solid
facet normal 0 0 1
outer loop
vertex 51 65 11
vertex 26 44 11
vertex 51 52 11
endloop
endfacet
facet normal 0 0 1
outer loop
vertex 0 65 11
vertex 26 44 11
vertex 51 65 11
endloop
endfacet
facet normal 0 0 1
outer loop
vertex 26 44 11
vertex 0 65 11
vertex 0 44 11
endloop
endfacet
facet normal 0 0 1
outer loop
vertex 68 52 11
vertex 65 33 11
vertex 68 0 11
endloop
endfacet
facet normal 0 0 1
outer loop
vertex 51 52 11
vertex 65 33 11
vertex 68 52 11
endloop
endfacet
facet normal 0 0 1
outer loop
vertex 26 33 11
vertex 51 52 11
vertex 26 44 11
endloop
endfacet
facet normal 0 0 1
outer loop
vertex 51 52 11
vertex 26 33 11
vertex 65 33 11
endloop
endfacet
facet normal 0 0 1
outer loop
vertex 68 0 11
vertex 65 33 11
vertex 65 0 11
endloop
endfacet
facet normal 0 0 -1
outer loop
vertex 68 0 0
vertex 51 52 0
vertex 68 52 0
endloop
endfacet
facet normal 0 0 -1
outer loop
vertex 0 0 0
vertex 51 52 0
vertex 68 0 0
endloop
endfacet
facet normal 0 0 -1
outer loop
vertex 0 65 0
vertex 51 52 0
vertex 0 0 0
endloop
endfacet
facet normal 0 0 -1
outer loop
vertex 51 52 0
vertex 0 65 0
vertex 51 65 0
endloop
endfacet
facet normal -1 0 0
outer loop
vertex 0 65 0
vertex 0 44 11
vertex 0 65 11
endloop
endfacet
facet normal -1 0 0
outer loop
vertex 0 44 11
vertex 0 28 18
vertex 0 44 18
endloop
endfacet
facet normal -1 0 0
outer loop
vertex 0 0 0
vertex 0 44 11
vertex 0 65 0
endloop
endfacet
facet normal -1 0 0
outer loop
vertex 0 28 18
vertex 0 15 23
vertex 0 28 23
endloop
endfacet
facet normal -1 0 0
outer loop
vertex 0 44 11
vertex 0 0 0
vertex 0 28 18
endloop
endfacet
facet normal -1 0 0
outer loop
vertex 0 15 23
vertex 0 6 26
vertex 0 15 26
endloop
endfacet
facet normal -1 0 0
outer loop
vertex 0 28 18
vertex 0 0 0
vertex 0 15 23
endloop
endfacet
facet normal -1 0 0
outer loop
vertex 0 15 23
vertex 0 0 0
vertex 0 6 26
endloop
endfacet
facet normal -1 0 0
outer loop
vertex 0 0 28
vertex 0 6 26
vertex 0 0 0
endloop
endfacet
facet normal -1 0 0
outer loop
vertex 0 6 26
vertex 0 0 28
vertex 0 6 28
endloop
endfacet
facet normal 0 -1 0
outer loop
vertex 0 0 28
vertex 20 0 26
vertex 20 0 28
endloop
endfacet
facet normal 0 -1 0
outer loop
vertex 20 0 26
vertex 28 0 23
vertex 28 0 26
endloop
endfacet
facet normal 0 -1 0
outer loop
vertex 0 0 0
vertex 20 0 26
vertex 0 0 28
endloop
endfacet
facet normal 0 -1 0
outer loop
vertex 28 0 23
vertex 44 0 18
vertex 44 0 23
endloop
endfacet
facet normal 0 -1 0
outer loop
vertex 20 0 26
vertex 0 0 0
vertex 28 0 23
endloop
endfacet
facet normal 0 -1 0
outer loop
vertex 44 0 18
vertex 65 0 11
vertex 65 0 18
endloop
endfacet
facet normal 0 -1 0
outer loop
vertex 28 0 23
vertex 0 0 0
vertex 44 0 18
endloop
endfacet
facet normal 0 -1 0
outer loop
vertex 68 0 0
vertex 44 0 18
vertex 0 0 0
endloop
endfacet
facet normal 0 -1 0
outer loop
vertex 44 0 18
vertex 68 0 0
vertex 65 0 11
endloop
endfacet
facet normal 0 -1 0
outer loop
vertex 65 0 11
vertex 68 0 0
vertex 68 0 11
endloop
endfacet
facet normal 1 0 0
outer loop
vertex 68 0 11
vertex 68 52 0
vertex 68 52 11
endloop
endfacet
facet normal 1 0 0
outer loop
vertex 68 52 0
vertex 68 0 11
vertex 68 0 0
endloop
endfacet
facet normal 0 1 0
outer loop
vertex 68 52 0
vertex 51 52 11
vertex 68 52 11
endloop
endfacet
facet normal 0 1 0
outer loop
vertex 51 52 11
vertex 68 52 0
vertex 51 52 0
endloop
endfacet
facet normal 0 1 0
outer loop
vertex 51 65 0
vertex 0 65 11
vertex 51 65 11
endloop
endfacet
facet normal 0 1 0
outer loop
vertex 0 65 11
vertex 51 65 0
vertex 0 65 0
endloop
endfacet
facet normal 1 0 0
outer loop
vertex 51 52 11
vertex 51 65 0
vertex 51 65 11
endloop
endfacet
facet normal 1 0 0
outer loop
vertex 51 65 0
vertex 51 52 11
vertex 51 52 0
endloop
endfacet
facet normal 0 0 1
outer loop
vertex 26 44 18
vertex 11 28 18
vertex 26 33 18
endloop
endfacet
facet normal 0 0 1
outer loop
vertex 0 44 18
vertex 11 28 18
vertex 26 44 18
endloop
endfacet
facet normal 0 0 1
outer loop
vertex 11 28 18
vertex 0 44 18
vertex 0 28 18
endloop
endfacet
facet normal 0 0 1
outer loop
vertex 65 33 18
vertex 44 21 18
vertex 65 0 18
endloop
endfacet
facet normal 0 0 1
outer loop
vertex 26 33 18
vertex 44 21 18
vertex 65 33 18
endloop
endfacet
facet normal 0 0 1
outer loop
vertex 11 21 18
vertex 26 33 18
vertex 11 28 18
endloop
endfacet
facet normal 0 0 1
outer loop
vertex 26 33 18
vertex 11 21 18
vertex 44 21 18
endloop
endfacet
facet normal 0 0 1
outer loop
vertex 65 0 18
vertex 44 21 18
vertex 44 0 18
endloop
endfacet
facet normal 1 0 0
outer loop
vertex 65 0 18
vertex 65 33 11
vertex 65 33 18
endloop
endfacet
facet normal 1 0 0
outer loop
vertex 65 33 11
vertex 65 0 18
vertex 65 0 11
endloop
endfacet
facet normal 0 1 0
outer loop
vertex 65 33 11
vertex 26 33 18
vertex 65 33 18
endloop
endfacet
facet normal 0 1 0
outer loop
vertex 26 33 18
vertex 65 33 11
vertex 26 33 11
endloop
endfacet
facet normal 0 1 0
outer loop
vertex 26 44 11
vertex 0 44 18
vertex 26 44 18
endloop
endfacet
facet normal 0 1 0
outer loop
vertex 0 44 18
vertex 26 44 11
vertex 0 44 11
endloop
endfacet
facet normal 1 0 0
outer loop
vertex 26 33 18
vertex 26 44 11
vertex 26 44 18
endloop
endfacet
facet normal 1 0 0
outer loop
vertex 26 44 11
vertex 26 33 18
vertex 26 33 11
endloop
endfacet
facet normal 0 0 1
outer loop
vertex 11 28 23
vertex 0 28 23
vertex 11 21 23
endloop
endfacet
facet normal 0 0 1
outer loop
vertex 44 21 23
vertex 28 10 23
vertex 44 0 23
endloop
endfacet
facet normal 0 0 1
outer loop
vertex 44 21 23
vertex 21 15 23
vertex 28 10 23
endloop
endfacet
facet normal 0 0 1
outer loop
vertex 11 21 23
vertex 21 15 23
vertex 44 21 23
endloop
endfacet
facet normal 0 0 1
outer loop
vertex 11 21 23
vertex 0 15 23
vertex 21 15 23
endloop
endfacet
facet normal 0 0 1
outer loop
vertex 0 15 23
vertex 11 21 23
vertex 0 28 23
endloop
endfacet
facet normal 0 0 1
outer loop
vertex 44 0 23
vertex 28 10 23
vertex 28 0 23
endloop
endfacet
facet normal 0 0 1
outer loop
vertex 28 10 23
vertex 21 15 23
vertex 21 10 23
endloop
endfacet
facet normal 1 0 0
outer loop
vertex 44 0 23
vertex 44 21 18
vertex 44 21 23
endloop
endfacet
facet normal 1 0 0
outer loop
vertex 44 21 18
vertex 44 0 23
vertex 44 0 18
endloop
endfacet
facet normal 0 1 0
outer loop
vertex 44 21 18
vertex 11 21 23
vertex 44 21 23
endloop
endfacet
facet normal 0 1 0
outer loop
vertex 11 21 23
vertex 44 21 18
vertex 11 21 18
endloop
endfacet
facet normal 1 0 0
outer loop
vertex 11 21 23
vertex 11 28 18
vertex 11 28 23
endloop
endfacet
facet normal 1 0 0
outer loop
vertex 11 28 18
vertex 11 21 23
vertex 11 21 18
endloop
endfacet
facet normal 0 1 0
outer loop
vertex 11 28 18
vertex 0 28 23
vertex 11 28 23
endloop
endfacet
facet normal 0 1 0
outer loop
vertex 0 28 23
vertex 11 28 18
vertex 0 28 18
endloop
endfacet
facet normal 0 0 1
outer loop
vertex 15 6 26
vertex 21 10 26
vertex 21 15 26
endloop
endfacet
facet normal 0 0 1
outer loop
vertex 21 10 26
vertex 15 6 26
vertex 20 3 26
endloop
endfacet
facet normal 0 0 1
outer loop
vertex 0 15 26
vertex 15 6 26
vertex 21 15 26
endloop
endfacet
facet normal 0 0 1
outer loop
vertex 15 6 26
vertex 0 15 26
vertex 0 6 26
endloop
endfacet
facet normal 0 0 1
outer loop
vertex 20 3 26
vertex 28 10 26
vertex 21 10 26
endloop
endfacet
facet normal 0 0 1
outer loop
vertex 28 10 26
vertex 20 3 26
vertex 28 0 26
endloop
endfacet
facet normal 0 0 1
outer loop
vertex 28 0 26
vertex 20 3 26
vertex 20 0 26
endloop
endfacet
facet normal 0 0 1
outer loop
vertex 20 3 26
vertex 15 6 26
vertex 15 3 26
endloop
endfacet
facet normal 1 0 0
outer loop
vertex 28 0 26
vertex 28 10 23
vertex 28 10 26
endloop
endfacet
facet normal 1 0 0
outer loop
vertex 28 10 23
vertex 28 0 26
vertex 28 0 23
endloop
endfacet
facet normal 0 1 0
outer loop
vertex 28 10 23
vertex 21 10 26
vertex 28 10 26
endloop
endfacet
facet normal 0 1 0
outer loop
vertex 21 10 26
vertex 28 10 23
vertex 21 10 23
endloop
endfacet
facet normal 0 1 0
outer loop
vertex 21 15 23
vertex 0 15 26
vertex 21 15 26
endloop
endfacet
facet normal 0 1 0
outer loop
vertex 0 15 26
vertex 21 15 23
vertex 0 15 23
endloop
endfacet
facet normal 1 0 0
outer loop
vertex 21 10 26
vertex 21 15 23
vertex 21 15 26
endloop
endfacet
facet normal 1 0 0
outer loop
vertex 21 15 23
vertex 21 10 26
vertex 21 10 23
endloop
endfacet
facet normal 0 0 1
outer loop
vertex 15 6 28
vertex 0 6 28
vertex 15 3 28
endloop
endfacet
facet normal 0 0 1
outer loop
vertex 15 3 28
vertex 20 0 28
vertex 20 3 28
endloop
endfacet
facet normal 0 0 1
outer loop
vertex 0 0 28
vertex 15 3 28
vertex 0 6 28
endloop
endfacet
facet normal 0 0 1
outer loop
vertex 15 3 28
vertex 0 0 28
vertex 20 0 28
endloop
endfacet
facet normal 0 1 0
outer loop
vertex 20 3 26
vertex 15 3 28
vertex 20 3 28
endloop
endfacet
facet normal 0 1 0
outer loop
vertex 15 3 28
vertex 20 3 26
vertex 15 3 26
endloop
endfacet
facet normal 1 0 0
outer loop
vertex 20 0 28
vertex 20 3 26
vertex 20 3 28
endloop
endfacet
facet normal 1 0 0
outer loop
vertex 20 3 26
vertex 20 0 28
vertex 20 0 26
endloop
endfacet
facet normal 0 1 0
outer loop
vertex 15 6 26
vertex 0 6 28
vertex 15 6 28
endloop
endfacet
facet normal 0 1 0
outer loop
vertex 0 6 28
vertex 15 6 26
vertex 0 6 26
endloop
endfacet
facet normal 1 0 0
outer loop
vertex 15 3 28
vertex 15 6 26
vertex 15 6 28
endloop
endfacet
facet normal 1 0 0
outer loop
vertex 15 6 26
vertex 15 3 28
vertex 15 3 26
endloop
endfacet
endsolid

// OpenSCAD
translate([8.5, 6.5, 5.5]) color([0.6489922579129634, 0.19497362064878687, 0.7834169698984913]) cube([17, 13, 11], center=true);
translate([25.5, 6.5, 5.5]) color([0.7774609885388588, 0.11099692345616674, 0.060160827712116616]) cube([17, 13, 11], center=true);
translate([42.5, 6.5, 5.5]) color([0.7008174245595068, 0.6143308403515266, 0.9339155207415325]) cube([17, 13, 11], center=true);
translate([59.5, 6.5, 5.5]) color([0.6504721799814983, 0.9694854220936419, 0.7136168898793864]) cube([17, 13, 11], center=true);
translate([8.5, 19.5, 5.5]) color([0.2963863893491513, 0.8491315553121948, 0.95846907728749]) cube([17, 13, 11], center=true);
translate([25.5, 19.5, 5.5]) color([0.38764569013819994, 0.29380353478258403, 0.7457841029207014]) cube([17, 13, 11], center=true);
translate([42.5, 19.5, 5.5]) color([0.9575468650535228, 0.98339807845839, 0.12155240415787172]) cube([17, 13, 11], center=true);
translate([59.5, 19.5, 5.5]) color([0.8604321836344089, 0.9958411320233901, 0.03818441020037311]) cube([17, 13, 11], center=true);
translate([8.5, 32.5, 5.5]) color([0.39202639046743215, 0.3715816420064585, 0.19047756087385292]) cube([17, 13, 11], center=true);
translate([25.5, 32.5, 5.5]) color([0.3565538137373233, 0.6320134108911423, 0.9564975354421206]) cube([17, 13, 11], center=true);
translate([42.5, 32.5, 5.5]) color([0.901927522825372, 0.039980675922074105, 0.2553863294502452]) cube([17, 13, 11], center=true);
translate([59.5, 32.5, 5.5]) color([0.02665600139486224, 0.5200631817170318, 0.5692567569896342]) cube([17, 13, 11], center=true);
translate([8.5, 45.5, 5.5]) color([0.8758772851227178, 0.2296552367022351, 0.7763426439418957]) cube([17, 13, 11], center=true);
translate([25.5, 45.5, 5.5]) color([0.8846860519705121, 0.6274277551427163, 0.5024128608294012]) cube([17, 13, 11], center=true);
translate([42.5, 45.5, 5.5]) color([0.5237115354844265, 0.5071067236759631, 0.9454855480301745]) cube([17, 13, 11], center=true);
translate([59.5, 45.5, 5.5]) color([0.14569042195357562, 0.8918421087116969, 0.42205651792049836]) cube([17, 13, 11], center=true);
translate([8.5, 58.5, 5.5]) color([0.08403205823715598, 0.1047646210762947, 0.06292282863863541]) cube([17, 13, 11], center=true);
translate([25.5, 58.5, 5.5]) color([0.4151614515022839, 0.15615697007089357, 0.9545538427732947]) cube([17, 13, 11], center=true);
translate([42.5, 58.5, 5.5]) color([0.7913428503775491, 0.43108631436838285, 0.41701950900356644]) cube([17, 13, 11], center=true);
translate([6.5, 5.5, 14.5]) color([0.4966247746294912, 0.86405767472269, 0.32449912818180593]) cube([13, 11, 7], center=true);
translate([19.5, 5.5, 14.5]) color([0.25258592574699623, 0.35250302456564797, 0.12137799977699892]) cube([13, 11, 7], center=true);
translate([32.5, 5.5, 14.5]) color([0.691775150815975, 0.34544510653523897, 0.17790766067776254]) cube([13, 11, 7], center=true);
translate([45.5, 5.5, 14.5]) color([0.830270051764872, 0.23049353673314077, 0.3658024748453319]) cube([13, 11, 7], center=true);
translate([58.5, 5.5, 14.5]) color([0.5965890354919068, 0.14329113966210216, 0.003232100641658797]) cube([13, 11, 7], center=true);
translate([6.5, 16.5, 14.5]) color([0.6590184917581017, 0.7321014772226084, 0.9009039411186286]) cube([13, 11, 7], center=true);
translate([19.5, 16.5, 14.5]) color([0.7479768172441763, 0.29326295382626455, 0.6894664766240866]) cube([13, 11, 7], center=true);
translate([32.5, 16.5, 14.5]) color([0.932788033819558, 0.23286310478430694, 0.14188743522012004]) cube([13, 11, 7], center=true);
translate([45.5, 16.5, 14.5]) color([0.4540480681686925, 0.4766939084563374, 0.7074804824528956]) cube([13, 11, 7], center=true);
translate([58.5, 16.5, 14.5]) color([0.2582188407343454, 0.027936242271358158, 0.20812012525081536]) cube([13, 11, 7], center=true);
translate([6.5, 27.5, 14.5]) color([0.33501316214628807, 0.9609071038114427, 0.29634664160852753]) cube([13, 11, 7], center=true);
translate([19.5, 27.5, 14.5]) color([0.8784103092413238, 0.5532045188241876, 0.32698413866792275]) cube([13, 11, 7], center=true);
translate([32.5, 27.5, 14.5]) color([0.5930193960141523, 0.08080901281968078, 0.5332278801564081]) cube([13, 11, 7], center=true);
translate([45.5, 27.5, 14.5]) color([0.30776249733867533, 0.3765889324074634, 0.14692685712634312]) cube([13, 11, 7], center=true);
translate([58.5, 27.5, 14.5]) color([0.1252359956830017, 0.2228174233130471, 0.5083324480268261]) cube([13, 11, 7], center=true);
translate([6.5, 38.5, 14.5]) color([0.23665719296677712, 0.18394442119493715, 0.3724619255943996]) cube([13, 11, 7], center=true);
translate([19.5, 38.5, 14.5]) color([0.6631955135334705, 0.8609746033864751, 0.6012082175951422]) cube([13, 11, 7], center=true);
translate([5.5, 3.5, 20.5]) color([0.3938011681878649, 0.7021695231885549, 0.13202027544551864]) cube([11, 7, 5], center=true);
translate([16.5, 3.5, 20.5]) color([0.29938666187805807, 0.4167493264442593, 0.9263964007964989]) cube([11, 7, 5], center=true);
translate([27.5, 3.5, 20.5]) color([0.5910765187605377, 0.2980281087530109, 0.35456411603507165]) cube([11, 7, 5], center=true);
translate([38.5, 3.5, 20.5]) color([0.24805850121983253, 0.6327789974902275, 0.6370445113549524]) cube([11, 7, 5], center=true);
translate([5.5, 10.5, 20.5]) color([0.5292072971005523, 0.376431751315491, 0.008427608141492793]) cube([11, 7, 5], center=true);
translate([16.5, 10.5, 20.5]) color([0.9619565585865117, 0.901262330417864, 0.44129738363616366]) cube([11, 7, 5], center=true);
translate([27.5, 10.5, 20.5]) color([0.3715965769686672, 0.9523409342086877, 0.09105648808381206]) cube([11, 7, 5], center=true);
translate([38.5, 10.5, 20.5]) color([0.18545820412424963, 0.10861526636012075, 0.11215874223546374]) cube([11, 7, 5], center=true);
translate([5.5, 17.5, 20.5]) color([0.6055458611860893, 0.15387883630139487, 0.7025980908137885]) cube([11, 7, 5], center=true);
translate([16.5, 17.5, 20.5]) color([0.928268212070889, 0.18538068806857422, 0.42170431041506296]) cube([11, 7, 5], center=true);
translate([27.5, 17.5, 20.5]) color([0.1747372019883816, 0.9595322940755414, 0.3403879026852894]) cube([11, 7, 5], center=true);
translate([38.5, 17.5, 20.5]) color([0.5233486454380116, 0.35536744790103547, 0.6315169232882821]) cube([11, 7, 5], center=true);
translate([5.5, 24.5, 20.5]) color([0.08649939658707362, 0.7550350740823142, 0.2947283238309857]) cube([11, 7, 5], center=true);
translate([3.5, 2.5, 24.5]) color([0.8301737658604361, 0.4490883769000732, 0.4620108455998946]) cube([7, 5, 3], center=true);
translate([10.5, 2.5, 24.5]) color([0.2187341846418389, 0.11445722556586746, 0.9788025142917065]) cube([7, 5, 3], center=true);
translate([17.5, 2.5, 24.5]) color([0.3011589686960586, 0.6091605287508749, 0.4242090709976407]) cube([7, 5, 3], center=true);
translate([24.5, 2.5, 24.5]) color([0.7513524999576429, 0.09255304692818778, 0.4976795968420046]) cube([7, 5, 3], center=true);
translate([3.5, 7.5, 24.5]) color([0.9609180855182016, 0.5437408220916614, 0.405305104554358]) cube([7, 5, 3], center=true);
translate([10.5, 7.5, 24.5]) color([0.6320656015278037, 0.0216193804206819, 0.2700784048715086]) cube([7, 5, 3], center=true);
translate([17.5, 7.5, 24.5]) color([0.6684886667173141, 0.0002532098932251925, 0.3984286079265319]) cube([7, 5, 3], center=true);
translate([24.5, 7.5, 24.5]) color([0.8905618085087551, 0.7099647178965433, 0.4445845492335537]) cube([7, 5, 3], center=true);
translate([3.5, 12.5, 24.5]) color([0.7465509493098265, 0.35382203223851694, 0.8712980207444939]) cube([7, 5, 3], center=true);
translate([10.5, 12.5, 24.5]) color([0.6725473918674463, 0.19603088941730495, 0.08525923665948931]) cube([7, 5, 3], center=true);
translate([17.5, 12.5, 24.5]) color([0.0704556688087915, 0.26248678792717994, 0.533638651221174]) cube([7, 5, 3], center=true);
translate([2.5, 1.5, 27.0]) color([0.11818482376773232, 0.8594532404023933, 0.8906989166138923]) cube([5, 3, 2], center=true);
translate([7.5, 1.5, 27.0]) color([0.7620005545284954, 0.06809296768032302, 0.8609410769469436]) cube([5, 3, 2], center=true);
translate([12.5, 1.5, 27.0]) color([0.2827478909480132, 0.13442052583382869, 0.5230599837537087]) cube([5, 3, 2], center=true);
translate([17.5, 1.5, 27.0]) color([0.21027834364306774, 0.10530639745894443, 0.9556548717215211]) cube([5, 3, 2], center=true);
translate([2.5, 4.5, 27.0]) color([0.5435731515542631, 0.7414270622920264, 0.9040457292510377]) cube([5, 3, 2], center=true);
translate([7.5, 4.5, 27.0]) color([0.2786145977098805, 0.4423646135017597, 0.5682329433322765]) cube([5, 3, 2], center=true);
translate([12.5, 4.5, 27.0]) color([0.13781274972163116, 0.1232982180791492, 0.12051785276403837]) cube([5, 3, 2], center=true);
